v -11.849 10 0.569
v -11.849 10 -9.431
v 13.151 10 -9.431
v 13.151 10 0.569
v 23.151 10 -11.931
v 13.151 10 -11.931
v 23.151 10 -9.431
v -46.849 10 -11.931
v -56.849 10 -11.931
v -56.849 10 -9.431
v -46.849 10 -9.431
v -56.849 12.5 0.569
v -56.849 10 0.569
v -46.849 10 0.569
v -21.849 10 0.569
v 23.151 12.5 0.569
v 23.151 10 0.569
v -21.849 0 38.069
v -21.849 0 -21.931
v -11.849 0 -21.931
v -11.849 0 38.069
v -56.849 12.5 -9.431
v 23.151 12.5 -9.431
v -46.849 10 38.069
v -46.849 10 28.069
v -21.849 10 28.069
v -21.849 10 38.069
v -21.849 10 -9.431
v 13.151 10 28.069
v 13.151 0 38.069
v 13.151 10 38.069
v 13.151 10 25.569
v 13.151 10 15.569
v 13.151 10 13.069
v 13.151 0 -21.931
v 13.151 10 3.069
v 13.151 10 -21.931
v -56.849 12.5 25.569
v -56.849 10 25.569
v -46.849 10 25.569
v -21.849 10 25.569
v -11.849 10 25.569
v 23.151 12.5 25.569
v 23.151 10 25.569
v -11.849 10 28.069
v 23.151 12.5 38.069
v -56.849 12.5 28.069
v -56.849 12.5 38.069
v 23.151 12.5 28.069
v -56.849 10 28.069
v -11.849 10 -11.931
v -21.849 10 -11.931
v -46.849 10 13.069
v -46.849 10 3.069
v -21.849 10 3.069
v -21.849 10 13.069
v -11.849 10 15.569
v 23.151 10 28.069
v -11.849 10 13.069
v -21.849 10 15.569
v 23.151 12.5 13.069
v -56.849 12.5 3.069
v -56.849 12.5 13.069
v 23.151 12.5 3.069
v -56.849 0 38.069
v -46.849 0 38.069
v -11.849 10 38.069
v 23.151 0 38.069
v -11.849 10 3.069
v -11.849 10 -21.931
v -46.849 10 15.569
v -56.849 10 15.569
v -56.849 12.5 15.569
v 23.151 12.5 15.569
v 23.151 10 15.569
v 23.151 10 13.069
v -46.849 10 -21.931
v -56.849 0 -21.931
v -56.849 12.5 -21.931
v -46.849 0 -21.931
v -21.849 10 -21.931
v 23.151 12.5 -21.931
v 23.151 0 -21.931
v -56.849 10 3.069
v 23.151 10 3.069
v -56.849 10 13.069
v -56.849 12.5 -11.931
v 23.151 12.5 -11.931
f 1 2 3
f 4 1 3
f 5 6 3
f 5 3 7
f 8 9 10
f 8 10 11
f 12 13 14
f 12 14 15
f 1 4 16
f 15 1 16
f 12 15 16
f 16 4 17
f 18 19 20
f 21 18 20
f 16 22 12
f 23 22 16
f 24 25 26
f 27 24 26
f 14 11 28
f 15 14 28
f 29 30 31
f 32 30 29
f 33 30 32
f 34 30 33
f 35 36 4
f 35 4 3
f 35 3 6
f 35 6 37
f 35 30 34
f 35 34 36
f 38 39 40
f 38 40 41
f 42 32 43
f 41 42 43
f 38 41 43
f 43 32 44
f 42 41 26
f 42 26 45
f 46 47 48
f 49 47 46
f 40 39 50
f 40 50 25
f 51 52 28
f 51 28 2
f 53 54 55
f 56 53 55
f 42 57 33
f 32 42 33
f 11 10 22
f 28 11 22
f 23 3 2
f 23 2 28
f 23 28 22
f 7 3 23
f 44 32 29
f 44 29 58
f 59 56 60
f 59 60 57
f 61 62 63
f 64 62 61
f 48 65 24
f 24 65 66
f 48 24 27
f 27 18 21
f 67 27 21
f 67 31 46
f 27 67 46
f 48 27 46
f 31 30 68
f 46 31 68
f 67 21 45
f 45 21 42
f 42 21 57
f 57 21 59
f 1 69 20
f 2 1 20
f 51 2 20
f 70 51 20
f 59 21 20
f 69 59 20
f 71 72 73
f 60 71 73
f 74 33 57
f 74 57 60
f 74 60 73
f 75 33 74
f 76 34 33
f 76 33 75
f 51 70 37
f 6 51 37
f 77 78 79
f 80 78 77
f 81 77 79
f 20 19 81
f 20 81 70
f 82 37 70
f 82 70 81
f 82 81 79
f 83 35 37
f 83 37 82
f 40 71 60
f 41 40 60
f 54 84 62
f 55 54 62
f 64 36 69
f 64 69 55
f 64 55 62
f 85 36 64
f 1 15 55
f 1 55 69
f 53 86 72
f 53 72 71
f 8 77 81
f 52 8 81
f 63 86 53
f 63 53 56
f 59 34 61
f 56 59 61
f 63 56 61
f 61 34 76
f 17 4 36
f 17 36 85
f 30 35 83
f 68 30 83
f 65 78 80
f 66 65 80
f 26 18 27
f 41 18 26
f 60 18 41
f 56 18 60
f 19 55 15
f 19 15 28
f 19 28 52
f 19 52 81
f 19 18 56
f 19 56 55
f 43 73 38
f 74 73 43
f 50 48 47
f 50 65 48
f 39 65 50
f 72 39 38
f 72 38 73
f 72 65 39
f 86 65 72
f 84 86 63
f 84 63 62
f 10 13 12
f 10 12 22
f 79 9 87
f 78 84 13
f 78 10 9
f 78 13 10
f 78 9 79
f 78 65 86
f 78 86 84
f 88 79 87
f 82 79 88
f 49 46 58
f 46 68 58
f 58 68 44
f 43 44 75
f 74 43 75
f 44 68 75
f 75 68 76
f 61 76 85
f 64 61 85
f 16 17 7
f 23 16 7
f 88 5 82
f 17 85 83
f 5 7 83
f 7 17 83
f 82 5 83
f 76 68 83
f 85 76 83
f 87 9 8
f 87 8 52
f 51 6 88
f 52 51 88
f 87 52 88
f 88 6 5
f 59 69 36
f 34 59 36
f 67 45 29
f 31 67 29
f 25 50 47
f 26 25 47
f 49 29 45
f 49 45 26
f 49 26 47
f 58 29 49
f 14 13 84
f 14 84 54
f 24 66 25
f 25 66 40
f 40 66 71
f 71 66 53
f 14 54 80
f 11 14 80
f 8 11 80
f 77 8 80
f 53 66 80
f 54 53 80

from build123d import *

# Parameters (mm, degrees)
CROQUIS1_W                = 10
CROQUIS1_H                = 60
SALIENTE_EXTRUIR1_DEPTH   = 10
SALIENTE_EXTRUIR1_2_DEPTH = 10
SALIENTE_EXTRUIR1_3_DEPTH = 10
CROQUIS2_W                = 80
CROQUIS2_H                = 10
SALIENTE_EXTRUIR2_DEPTH   = 2.5


with BuildPart() as part:
    # Croquis1 → Saliente-Extruir1 (new body)
    with BuildSketch(Plane(origin=(0, 0, 0), x_dir=(1, 0, 0), z_dir=(0, 1, 0))):
        with Locations((-51.849391859, -8.068789191)):
            Rectangle(CROQUIS1_W, CROQUIS1_H)
    extrude(amount=SALIENTE_EXTRUIR1_DEPTH)



with BuildPart() as body_2:
    # Croquis1 → Saliente-Extruir1 2 (new body)
    with BuildSketch(Plane(origin=(0, 0, 0), x_dir=(1, 0, 0), z_dir=(0, 1, 0))):
        with Locations((-16.849391859, -8.068789191)):
            Rectangle(CROQUIS1_W, CROQUIS1_H)
    extrude(amount=SALIENTE_EXTRUIR1_2_DEPTH)


with BuildPart() as body_3:
    # Croquis1 → Saliente-Extruir1 3 (new body)
    with BuildSketch(Plane(origin=(0, 0, 0), x_dir=(1, 0, 0), z_dir=(0, 1, 0))):
        with Locations((18.150608141, -8.068789191)):
            Rectangle(CROQUIS1_W, CROQUIS1_H)
    extrude(amount=SALIENTE_EXTRUIR1_3_DEPTH)


with BuildPart() as part_1:
    add(part.part)

    add(body_2.part)  # Saliente-Extruir2 merges body 2

    add(body_3.part)  # Saliente-Extruir2 merges body 3
    # Croquis2 → Saliente-Extruir2 (add)
    with BuildSketch(Plane(origin=(0, 10, 0), x_dir=(1, 0, 0), z_dir=(0, 1, 0))):
        with Locations((-16.849391859, -33.068789191)):
            Rectangle(CROQUIS2_W, CROQUIS2_H)
        with Locations((-16.849391859, 16.931210809)):
            Rectangle(CROQUIS2_W, CROQUIS2_H)
        with Locations((-16.849391859, 4.431210809)):
            Rectangle(CROQUIS2_W, CROQUIS2_H)
        with Locations((-16.849391859, -20.568789191)):
            Rectangle(CROQUIS2_W, CROQUIS2_H)
        with Locations((-16.849391859, -8.068789191)):
            Rectangle(CROQUIS2_W, CROQUIS2_H)
    extrude(amount=SALIENTE_EXTRUIR2_DEPTH)


solid = part_1.part
